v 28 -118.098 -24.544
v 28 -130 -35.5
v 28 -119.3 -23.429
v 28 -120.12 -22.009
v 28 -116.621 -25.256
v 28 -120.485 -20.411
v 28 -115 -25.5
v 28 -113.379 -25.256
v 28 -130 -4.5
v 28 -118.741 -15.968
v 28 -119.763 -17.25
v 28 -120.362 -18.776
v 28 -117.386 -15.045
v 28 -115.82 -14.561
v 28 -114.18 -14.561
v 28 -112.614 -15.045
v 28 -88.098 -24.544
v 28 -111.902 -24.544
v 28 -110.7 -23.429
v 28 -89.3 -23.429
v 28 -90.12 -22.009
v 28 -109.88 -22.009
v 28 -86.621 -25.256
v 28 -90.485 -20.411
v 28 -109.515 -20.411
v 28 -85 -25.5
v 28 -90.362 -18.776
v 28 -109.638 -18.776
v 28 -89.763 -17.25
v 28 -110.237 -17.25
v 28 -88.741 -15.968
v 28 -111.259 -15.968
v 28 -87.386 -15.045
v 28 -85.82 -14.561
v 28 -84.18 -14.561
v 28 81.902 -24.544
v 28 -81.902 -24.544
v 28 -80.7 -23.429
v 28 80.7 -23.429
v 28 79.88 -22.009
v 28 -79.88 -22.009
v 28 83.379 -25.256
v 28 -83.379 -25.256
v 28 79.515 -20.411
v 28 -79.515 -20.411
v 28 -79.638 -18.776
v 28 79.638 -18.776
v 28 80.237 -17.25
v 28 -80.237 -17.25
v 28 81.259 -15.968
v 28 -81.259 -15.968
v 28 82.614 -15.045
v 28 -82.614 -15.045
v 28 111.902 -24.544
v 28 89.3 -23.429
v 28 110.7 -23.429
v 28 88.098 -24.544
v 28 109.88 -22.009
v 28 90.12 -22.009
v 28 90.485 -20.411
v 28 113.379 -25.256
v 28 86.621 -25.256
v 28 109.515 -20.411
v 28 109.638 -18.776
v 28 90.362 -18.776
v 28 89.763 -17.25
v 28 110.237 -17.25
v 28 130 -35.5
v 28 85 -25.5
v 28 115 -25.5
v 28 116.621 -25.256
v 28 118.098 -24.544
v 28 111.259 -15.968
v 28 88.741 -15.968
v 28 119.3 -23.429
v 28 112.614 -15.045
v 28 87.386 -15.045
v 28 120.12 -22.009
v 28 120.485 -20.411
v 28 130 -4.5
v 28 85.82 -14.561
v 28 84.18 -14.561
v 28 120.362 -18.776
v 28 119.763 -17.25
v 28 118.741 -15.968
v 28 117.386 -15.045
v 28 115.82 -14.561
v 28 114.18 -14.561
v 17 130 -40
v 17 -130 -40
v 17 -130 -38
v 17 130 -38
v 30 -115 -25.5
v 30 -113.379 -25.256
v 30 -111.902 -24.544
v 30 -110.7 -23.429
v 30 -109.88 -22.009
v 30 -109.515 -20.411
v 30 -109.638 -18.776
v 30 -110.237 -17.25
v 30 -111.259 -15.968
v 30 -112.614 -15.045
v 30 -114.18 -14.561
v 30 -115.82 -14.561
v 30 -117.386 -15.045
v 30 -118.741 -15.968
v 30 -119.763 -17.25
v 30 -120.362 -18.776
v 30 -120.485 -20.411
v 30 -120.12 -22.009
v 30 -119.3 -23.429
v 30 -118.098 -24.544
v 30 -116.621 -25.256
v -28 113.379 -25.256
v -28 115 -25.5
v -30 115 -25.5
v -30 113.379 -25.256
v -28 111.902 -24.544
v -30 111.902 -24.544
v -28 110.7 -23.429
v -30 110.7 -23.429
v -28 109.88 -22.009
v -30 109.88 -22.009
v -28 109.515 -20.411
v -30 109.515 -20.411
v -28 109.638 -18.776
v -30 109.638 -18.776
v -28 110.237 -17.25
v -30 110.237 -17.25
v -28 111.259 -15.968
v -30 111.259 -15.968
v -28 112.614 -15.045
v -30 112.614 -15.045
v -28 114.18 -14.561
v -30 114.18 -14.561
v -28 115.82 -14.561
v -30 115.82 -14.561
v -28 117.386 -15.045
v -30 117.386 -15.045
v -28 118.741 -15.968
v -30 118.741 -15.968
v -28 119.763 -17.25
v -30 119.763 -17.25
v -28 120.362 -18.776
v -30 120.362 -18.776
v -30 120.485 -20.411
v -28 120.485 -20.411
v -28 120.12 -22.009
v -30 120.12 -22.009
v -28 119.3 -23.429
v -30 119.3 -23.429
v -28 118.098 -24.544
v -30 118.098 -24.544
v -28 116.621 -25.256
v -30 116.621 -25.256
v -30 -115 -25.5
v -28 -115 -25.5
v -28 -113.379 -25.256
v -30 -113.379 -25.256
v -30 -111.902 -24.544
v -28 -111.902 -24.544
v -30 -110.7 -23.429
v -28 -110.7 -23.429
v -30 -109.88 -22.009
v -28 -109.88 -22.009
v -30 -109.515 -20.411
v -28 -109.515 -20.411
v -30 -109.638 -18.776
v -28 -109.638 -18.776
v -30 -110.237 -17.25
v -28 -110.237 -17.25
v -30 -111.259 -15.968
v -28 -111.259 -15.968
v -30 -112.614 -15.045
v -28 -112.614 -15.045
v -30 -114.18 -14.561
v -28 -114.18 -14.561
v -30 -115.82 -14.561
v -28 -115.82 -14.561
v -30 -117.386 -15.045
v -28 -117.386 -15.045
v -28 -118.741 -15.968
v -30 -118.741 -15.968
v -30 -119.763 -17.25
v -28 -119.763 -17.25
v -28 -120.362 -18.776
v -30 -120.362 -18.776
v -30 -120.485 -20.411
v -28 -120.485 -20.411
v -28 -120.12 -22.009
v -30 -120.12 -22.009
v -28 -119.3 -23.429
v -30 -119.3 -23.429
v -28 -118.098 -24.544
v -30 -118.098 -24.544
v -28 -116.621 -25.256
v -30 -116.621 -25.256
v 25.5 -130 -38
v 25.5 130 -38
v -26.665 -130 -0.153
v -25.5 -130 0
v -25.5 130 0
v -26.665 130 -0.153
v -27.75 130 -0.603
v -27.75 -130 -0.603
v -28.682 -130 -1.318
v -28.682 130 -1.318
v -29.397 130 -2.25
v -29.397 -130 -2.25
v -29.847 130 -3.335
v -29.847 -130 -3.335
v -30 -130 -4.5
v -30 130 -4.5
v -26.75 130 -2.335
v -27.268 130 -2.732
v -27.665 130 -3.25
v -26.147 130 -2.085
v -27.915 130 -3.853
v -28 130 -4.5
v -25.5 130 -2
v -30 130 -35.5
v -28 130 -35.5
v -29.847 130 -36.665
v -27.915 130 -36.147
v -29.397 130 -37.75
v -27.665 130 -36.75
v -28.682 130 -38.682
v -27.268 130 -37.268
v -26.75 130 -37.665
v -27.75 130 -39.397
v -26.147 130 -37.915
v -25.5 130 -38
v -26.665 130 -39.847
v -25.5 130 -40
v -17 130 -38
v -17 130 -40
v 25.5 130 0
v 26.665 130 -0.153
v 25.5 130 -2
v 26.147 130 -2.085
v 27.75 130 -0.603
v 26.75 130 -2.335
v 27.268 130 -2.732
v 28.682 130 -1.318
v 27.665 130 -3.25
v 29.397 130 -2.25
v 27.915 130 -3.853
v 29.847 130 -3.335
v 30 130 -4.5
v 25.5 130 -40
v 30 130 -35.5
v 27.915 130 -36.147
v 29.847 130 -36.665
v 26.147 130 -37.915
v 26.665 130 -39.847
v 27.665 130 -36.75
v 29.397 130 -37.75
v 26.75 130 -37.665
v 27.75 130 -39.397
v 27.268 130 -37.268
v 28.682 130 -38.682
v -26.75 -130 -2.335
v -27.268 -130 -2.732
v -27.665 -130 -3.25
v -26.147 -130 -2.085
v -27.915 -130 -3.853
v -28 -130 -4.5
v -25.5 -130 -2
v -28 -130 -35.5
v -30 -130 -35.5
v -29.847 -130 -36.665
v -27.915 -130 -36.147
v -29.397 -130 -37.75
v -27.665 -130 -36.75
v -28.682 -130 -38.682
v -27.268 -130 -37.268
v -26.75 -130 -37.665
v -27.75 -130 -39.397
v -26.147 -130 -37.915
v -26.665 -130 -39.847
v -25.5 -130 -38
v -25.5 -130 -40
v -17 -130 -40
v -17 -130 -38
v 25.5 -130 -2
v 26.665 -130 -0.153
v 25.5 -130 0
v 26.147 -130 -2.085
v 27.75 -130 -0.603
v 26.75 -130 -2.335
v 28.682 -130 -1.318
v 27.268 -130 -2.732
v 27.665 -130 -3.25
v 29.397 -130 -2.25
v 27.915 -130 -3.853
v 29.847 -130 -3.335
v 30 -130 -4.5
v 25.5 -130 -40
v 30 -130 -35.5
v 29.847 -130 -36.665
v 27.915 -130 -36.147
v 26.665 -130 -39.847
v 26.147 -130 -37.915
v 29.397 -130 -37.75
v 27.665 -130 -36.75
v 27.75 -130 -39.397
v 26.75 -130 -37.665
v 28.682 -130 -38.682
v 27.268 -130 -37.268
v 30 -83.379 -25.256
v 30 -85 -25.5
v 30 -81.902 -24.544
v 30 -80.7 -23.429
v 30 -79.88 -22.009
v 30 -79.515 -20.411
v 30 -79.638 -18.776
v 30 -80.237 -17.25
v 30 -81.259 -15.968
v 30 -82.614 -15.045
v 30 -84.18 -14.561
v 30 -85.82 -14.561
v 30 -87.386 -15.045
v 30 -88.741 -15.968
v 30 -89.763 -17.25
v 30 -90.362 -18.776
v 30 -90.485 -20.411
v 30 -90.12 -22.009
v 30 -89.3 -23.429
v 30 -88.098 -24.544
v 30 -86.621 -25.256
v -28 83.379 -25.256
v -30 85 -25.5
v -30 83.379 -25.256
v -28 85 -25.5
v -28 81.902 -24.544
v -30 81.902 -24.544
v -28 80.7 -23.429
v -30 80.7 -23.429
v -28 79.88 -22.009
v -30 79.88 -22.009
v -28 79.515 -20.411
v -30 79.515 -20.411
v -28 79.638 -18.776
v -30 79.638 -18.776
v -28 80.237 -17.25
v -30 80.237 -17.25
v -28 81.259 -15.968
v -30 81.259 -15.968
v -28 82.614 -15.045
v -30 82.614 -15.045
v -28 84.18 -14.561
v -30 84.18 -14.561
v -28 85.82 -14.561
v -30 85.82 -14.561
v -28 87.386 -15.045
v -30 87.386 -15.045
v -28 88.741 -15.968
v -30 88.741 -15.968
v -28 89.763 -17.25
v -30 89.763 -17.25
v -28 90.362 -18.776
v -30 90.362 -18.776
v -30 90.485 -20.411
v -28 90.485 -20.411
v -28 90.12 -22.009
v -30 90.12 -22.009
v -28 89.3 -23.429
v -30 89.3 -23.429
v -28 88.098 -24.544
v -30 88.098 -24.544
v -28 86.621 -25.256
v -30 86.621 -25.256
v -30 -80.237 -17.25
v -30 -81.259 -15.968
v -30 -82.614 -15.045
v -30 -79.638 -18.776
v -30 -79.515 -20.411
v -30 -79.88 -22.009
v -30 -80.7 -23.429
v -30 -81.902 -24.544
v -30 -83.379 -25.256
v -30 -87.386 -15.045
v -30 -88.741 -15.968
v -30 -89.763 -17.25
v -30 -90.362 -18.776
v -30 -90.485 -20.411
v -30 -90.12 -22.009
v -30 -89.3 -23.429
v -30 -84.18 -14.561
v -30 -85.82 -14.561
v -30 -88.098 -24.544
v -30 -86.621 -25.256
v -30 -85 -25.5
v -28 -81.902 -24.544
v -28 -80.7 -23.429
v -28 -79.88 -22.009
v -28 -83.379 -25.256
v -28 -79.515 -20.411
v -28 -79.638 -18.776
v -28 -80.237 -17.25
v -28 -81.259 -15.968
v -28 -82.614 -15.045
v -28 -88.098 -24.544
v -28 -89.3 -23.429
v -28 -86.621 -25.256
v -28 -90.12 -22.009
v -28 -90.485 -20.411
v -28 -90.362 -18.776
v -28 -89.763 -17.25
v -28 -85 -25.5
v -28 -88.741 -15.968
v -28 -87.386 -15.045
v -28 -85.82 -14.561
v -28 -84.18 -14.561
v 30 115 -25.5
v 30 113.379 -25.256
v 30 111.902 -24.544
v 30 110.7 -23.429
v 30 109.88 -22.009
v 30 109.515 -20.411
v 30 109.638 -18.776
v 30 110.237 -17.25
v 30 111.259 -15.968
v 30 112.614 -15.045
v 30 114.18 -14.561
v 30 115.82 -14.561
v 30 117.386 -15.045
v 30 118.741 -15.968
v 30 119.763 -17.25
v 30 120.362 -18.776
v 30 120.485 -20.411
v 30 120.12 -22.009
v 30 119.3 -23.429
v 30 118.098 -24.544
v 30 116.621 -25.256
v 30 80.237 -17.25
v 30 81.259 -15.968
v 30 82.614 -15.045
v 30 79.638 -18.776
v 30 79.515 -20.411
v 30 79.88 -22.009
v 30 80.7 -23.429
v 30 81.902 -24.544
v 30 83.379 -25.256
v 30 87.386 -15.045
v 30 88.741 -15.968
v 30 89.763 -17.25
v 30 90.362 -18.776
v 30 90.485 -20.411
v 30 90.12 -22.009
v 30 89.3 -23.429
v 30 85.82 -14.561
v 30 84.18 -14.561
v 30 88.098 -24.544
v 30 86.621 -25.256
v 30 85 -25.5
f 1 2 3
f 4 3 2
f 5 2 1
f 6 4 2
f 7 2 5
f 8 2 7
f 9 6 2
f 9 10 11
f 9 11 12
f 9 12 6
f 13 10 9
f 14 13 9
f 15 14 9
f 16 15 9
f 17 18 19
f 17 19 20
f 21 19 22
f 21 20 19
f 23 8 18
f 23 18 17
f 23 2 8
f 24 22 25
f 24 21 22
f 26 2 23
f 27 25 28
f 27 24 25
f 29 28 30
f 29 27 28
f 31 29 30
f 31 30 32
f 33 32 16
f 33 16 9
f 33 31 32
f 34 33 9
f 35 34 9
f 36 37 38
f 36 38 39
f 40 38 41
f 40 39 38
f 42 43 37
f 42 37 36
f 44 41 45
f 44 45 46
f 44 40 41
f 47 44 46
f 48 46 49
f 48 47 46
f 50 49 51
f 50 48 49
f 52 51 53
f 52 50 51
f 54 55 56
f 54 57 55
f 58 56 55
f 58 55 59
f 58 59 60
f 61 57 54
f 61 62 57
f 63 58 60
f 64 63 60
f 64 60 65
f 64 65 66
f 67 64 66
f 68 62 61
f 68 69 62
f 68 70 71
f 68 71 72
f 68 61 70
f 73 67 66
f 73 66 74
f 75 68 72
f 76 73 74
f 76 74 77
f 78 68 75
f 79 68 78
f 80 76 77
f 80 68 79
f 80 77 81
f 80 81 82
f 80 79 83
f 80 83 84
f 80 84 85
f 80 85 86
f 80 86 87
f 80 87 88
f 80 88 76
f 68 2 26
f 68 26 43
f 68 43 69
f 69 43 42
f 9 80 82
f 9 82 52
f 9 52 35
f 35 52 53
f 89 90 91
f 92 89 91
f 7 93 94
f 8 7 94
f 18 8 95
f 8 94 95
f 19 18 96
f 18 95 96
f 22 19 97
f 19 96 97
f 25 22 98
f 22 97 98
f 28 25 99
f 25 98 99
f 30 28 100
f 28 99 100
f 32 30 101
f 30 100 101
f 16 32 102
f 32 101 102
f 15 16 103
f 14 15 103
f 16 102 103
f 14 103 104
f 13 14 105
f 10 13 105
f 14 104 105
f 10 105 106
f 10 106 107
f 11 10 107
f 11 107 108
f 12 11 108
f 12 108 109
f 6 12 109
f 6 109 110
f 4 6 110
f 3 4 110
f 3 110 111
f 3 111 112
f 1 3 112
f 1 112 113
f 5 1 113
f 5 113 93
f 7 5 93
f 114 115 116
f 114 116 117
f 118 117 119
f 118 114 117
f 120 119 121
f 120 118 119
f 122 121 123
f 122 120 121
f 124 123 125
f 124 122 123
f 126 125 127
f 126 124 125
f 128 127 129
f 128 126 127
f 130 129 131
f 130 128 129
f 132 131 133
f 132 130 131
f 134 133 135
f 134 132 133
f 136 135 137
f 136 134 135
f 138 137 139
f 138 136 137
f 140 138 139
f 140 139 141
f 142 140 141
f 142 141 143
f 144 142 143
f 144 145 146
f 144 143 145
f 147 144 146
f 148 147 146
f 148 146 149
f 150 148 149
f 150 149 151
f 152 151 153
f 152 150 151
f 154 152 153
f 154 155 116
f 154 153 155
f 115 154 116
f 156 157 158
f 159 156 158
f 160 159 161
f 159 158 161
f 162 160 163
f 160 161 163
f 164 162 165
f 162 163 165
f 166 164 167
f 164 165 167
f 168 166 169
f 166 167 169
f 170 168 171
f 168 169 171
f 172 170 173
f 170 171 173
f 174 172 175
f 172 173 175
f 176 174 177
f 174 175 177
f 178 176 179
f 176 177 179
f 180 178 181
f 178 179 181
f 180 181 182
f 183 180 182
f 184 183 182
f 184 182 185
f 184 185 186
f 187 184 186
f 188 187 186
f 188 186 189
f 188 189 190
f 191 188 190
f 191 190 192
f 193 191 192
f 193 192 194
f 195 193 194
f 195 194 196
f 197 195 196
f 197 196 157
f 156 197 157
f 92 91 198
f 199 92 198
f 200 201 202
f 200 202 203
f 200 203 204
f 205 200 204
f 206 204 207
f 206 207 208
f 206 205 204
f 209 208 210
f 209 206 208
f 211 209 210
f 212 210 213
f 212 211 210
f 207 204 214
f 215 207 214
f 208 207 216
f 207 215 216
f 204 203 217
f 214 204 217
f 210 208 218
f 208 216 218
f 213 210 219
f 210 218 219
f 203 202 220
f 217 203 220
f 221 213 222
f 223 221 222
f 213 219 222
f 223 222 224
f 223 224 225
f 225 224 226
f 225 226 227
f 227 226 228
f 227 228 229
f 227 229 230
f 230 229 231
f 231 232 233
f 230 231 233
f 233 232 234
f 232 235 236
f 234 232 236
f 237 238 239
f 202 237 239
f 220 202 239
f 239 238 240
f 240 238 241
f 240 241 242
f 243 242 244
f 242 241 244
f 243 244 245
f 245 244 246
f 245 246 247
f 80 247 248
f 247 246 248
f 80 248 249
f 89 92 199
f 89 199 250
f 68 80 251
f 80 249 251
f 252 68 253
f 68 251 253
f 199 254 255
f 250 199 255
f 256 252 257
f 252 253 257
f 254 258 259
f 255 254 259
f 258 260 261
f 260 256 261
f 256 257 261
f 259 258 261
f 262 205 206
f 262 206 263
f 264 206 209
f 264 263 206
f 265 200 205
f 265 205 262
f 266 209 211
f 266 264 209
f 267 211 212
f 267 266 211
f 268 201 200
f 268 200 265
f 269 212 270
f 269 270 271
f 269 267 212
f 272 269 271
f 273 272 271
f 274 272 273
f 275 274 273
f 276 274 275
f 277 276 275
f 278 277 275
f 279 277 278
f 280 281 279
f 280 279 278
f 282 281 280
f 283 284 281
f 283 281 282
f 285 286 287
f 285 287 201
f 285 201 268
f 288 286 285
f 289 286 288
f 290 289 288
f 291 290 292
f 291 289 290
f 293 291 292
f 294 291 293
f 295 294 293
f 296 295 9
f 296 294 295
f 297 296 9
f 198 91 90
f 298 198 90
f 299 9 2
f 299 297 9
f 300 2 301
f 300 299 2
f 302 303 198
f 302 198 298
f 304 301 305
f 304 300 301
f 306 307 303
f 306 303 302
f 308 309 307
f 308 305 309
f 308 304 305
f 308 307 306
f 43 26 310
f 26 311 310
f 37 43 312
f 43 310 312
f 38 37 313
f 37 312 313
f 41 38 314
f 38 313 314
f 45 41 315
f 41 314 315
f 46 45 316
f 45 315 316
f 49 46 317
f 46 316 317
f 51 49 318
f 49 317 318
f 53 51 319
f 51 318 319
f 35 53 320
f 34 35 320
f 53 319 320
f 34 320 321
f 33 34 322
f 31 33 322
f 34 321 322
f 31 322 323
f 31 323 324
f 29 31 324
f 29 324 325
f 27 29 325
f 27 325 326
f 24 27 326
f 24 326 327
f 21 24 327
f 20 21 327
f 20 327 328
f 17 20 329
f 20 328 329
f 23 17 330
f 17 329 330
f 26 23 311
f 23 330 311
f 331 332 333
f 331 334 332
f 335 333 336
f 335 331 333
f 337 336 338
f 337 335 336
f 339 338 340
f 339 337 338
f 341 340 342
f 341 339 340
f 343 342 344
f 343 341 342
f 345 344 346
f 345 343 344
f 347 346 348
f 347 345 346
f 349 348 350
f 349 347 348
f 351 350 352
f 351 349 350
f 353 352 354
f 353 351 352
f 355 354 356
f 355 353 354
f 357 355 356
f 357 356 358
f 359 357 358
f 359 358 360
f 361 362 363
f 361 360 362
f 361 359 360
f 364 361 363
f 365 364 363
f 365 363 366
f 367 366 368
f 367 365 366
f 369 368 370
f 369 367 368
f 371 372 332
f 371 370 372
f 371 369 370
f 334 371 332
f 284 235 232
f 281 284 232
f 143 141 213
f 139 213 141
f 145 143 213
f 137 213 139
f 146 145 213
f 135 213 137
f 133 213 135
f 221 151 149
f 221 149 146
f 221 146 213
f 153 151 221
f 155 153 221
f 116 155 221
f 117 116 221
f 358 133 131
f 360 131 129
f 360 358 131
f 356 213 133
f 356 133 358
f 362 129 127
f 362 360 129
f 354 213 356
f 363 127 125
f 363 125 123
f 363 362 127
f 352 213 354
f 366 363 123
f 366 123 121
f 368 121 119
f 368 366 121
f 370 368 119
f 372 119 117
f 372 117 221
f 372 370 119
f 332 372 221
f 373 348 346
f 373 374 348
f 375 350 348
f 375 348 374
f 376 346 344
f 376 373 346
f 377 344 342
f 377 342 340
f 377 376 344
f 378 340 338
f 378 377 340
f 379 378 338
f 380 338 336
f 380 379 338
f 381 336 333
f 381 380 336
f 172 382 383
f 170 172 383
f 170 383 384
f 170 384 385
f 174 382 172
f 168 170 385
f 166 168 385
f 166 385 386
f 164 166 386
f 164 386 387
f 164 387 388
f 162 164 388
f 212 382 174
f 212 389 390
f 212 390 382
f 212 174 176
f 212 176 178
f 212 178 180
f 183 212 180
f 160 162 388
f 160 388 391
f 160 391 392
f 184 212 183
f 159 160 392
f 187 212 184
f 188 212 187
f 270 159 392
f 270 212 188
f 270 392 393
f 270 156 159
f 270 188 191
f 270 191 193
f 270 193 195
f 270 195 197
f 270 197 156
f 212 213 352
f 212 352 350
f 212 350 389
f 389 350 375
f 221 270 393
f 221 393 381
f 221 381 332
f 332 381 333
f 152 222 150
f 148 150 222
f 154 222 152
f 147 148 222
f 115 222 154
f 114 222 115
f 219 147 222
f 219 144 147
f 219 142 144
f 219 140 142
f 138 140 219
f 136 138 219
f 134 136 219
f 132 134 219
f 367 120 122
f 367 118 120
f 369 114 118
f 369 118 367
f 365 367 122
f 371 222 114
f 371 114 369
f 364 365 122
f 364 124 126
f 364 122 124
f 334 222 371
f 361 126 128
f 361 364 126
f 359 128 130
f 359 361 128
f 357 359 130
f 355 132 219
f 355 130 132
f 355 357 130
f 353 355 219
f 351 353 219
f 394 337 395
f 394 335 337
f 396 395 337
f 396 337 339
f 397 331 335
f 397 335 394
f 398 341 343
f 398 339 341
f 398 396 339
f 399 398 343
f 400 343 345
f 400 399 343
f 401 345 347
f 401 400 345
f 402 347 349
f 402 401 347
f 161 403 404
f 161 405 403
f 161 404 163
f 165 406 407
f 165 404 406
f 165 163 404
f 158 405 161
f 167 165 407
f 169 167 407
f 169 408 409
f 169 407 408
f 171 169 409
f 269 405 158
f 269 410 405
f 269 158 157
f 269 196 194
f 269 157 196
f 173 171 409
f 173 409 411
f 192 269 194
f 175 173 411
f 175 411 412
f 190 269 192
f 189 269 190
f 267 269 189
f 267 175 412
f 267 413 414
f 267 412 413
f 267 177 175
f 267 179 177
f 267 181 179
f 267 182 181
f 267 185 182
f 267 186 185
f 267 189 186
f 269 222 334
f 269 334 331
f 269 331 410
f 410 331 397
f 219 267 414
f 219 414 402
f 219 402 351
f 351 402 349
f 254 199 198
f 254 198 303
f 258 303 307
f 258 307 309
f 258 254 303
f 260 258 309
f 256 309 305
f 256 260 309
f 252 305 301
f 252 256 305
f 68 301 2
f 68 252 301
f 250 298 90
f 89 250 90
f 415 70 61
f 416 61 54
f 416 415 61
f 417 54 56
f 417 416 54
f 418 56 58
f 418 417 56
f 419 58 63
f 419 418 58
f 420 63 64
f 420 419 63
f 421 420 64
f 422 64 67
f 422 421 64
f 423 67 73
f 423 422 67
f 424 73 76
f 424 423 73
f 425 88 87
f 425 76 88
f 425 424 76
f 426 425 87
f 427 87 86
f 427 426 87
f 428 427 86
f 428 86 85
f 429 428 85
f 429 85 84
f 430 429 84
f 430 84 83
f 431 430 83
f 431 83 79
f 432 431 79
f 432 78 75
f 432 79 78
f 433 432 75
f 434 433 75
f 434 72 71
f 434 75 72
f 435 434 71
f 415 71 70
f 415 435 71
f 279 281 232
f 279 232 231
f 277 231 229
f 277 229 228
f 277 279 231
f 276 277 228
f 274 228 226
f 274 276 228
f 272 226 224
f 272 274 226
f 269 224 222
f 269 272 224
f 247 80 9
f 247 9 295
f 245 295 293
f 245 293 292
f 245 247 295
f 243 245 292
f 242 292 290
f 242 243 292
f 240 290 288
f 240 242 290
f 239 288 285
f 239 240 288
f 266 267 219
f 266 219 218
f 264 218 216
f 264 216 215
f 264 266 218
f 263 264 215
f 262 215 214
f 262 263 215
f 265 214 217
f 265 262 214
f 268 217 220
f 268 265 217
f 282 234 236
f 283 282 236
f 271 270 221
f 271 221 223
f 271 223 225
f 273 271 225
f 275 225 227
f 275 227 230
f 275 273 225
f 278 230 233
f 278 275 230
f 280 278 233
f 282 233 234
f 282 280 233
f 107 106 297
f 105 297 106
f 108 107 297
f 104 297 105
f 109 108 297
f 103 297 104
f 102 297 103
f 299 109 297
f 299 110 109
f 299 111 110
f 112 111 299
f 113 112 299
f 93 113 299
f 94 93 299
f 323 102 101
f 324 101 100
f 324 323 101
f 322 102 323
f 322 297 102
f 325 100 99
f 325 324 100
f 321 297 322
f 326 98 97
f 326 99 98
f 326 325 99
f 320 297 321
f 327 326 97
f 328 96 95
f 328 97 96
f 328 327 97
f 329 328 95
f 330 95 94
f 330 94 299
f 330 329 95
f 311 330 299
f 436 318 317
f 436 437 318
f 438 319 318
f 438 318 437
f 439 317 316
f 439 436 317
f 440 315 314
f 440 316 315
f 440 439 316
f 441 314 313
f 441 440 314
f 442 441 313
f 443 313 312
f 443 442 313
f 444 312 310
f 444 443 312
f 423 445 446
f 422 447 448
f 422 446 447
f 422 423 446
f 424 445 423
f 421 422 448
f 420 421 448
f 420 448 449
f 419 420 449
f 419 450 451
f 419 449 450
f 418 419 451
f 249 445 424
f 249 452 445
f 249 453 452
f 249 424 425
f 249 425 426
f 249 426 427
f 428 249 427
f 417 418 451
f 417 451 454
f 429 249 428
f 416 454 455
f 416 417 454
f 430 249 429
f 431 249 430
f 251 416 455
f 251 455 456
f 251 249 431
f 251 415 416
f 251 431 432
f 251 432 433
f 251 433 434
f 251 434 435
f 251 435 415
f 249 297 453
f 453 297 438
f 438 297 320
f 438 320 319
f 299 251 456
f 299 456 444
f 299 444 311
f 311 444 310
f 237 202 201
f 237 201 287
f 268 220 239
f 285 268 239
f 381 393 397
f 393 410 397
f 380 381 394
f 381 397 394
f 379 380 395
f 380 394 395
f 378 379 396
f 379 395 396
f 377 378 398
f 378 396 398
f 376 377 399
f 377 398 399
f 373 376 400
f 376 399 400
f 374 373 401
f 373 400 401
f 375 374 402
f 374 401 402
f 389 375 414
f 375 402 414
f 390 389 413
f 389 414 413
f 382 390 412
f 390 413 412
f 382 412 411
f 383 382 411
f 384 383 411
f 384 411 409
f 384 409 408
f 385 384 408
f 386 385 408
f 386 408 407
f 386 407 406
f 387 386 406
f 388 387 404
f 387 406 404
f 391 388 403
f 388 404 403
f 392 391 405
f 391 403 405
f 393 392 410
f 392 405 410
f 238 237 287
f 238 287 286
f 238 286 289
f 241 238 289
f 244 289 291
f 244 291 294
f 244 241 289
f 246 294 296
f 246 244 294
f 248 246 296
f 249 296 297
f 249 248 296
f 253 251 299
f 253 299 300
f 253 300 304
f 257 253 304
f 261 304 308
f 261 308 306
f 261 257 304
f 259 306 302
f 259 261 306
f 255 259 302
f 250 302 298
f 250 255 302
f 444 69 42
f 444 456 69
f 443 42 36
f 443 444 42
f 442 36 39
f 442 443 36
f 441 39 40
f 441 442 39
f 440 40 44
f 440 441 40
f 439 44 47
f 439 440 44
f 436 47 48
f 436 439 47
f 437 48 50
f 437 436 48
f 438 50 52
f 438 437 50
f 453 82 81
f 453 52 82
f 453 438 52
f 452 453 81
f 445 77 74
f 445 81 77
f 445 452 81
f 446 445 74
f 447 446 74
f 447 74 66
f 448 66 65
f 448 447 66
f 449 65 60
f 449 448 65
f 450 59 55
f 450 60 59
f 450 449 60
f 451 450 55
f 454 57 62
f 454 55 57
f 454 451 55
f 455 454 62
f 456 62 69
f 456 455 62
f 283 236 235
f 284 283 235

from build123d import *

# Parameters (mm, degrees)
SKETCH1_W                      = 60
SKETCH1_H                      = 260
BASE_FLANGE1_DEPTH             = 2
EDGE_FLANGE1_STRIP_W           = 13
EDGE_FLANGE1_STRIP_H           = 2
EDGE_FLANGE1_STRIP_CUT_DEPTH   = 260
EDGE_FLANGE1_STRIP_2_W         = 13
EDGE_FLANGE1_STRIP_2_H         = 2
EDGE_FLANGE1_STRIP_CUT_2_DEPTH = 260
EDGE_FLANGE1_DEPTH             = 260
EDGE_FLANGE1_BEND_DEPTH        = 260
EDGE_FLANGE2_STRIP_W           = 13
EDGE_FLANGE2_STRIP_H           = 2
EDGE_FLANGE2_STRIP_CUT_DEPTH   = 260
EDGE_FLANGE2_STRIP_2_W         = 13
EDGE_FLANGE2_STRIP_2_H         = 2
EDGE_FLANGE2_STRIP_CUT_2_DEPTH = 260
EDGE_FLANGE2_DEPTH             = 260
EDGE_FLANGE2_BEND_DEPTH        = 260
SKETCH18_R                     = 5.5
CUT_EXTRUDE1_DEPTH             = 149.660687473


# Sheet-metal steps are written as plain solids
with BuildPart() as part:
    # Sketch1 → Base-Flange1 (new body)
    with BuildSketch(Plane.XY):
        Rectangle(SKETCH1_W, SKETCH1_H)
    extrude(amount=-BASE_FLANGE1_DEPTH)

    # Edge-Flange1 strip (across the edge) → Edge-Flange1 strip cut (cut)
    with BuildSketch(Plane(origin=(30, 130, -2), x_dir=(-1, 0, 0), z_dir=(0, -1, 0))):
        with Locations((-2, -1)):
            Rectangle(EDGE_FLANGE1_STRIP_W, EDGE_FLANGE1_STRIP_H)
    extrude(amount=EDGE_FLANGE1_STRIP_CUT_DEPTH, mode=Mode.SUBTRACT)

    # Edge-Flange1 strip 2 (across the edge) → Edge-Flange1 strip cut 2 (cut)
    with BuildSketch(Plane(origin=(-30, -130, -2), x_dir=(1, 0, 0), z_dir=(0, 1, 0))):
        with Locations((-2, -1)):
            Rectangle(EDGE_FLANGE1_STRIP_2_W, EDGE_FLANGE1_STRIP_2_H)
    extrude(amount=EDGE_FLANGE1_STRIP_CUT_2_DEPTH, mode=Mode.SUBTRACT)

    # Edge-Flange1 section (across the edge) → Edge-Flange1 (add)
    with BuildSketch(Plane(origin=(30, 130, -2), x_dir=(-1, 0, 0), z_dir=(0, -1, 0))):
        with BuildLine():
            Line((0, 2.5), (0, 38))
            Line((0, 38), (2, 38))
            Line((2, 38), (2, 2.5))
            ThreePointArc((2, 2.5), (2.732233047, 0.732233047), (4.5, 0))
            Line((4.5, 0), (4.5, -2))
            ThreePointArc((4.5, -2), (1.318019485, -0.681980515), (0, 2.5))
        make_face()
    extrude(amount=EDGE_FLANGE1_DEPTH)

    # Edge-Flange1 section 2 (across the edge) → Edge-Flange1 bend (add)
    with BuildSketch(Plane(origin=(-30, -130, -2), x_dir=(1, 0, 0), z_dir=(0, 1, 0))):
        with BuildLine():
            Line((0, 2.5), (0, 38))
            Line((0, 38), (2, 38))
            Line((2, 38), (2, 2.5))
            ThreePointArc((2, 2.5), (2.732233047, 0.732233047), (4.5, 0))
            Line((4.5, 0), (4.5, -2))
            ThreePointArc((4.5, -2), (1.318019485, -0.681980515), (0, 2.5))
        make_face()
    extrude(amount=EDGE_FLANGE1_BEND_DEPTH)

    # Edge-Flange2 strip (across the edge) → Edge-Flange2 strip cut (cut)
    with BuildSketch(Plane(origin=(28, 130, -40), x_dir=(0, 0, 1), z_dir=(0, -1, 0))):
        with Locations((-2, -1)):
            Rectangle(EDGE_FLANGE2_STRIP_W, EDGE_FLANGE2_STRIP_H)
    extrude(amount=EDGE_FLANGE2_STRIP_CUT_DEPTH, mode=Mode.SUBTRACT)

    # Edge-Flange2 strip 2 (across the edge) → Edge-Flange2 strip cut 2 (cut)
    with BuildSketch(Plane(origin=(-28, -130, -40), x_dir=(0, 0, 1), z_dir=(0, 1, 0))):
        with Locations((-2, -1)):
            Rectangle(EDGE_FLANGE2_STRIP_2_W, EDGE_FLANGE2_STRIP_2_H)
    extrude(amount=EDGE_FLANGE2_STRIP_CUT_2_DEPTH, mode=Mode.SUBTRACT)

    # Edge-Flange2 section (across the edge) → Edge-Flange2 (add)
    with BuildSketch(Plane(origin=(28, 130, -40), x_dir=(0, 0, 1), z_dir=(0, -1, 0))):
        with BuildLine():
            Line((0, 2.5), (0, 11))
            Line((0, 11), (2, 11))
            Line((2, 11), (2, 2.5))
            ThreePointArc((2, 2.5), (2.732233047, 0.732233047), (4.5, 0))
            Line((4.5, 0), (4.5, -2))
            ThreePointArc((4.5, -2), (1.318019485, -0.681980515), (0, 2.5))
        make_face()
    extrude(amount=EDGE_FLANGE2_DEPTH)

    # Edge-Flange2 section 2 (across the edge) → Edge-Flange2 bend (add)
    with BuildSketch(Plane(origin=(-28, -130, -40), x_dir=(0, 0, 1), z_dir=(0, 1, 0))):
        with BuildLine():
            Line((0, 2.5), (0, 11))
            Line((0, 11), (2, 11))
            Line((2, 11), (2, 2.5))
            ThreePointArc((2, 2.5), (2.732233047, 0.732233047), (4.5, 0))
            Line((4.5, 0), (4.5, -2))
            ThreePointArc((4.5, -2), (1.318019485, -0.681980515), (0, 2.5))
        make_face()
    extrude(amount=EDGE_FLANGE2_BEND_DEPTH)

    # Sketch18 → Cut-Extrude1 (cut, symmetric)
    with BuildSketch(Plane(origin=(30, 0, 0), x_dir=(0, 0, -1), z_dir=(1, 0, 0))):
        with Locations((20, -115)):
            Circle(SKETCH18_R)
        with Locations((20, -85)):
            Circle(SKETCH18_R)
    cut_extrude1 = extrude(amount=CUT_EXTRUDE1_DEPTH, both=True, mode=Mode.SUBTRACT)

    # Mirror1: Cut-Extrude1 across plane
    add(cut_extrude1.mirror(Plane.ZX), mode=Mode.SUBTRACT)


solid = part.part
